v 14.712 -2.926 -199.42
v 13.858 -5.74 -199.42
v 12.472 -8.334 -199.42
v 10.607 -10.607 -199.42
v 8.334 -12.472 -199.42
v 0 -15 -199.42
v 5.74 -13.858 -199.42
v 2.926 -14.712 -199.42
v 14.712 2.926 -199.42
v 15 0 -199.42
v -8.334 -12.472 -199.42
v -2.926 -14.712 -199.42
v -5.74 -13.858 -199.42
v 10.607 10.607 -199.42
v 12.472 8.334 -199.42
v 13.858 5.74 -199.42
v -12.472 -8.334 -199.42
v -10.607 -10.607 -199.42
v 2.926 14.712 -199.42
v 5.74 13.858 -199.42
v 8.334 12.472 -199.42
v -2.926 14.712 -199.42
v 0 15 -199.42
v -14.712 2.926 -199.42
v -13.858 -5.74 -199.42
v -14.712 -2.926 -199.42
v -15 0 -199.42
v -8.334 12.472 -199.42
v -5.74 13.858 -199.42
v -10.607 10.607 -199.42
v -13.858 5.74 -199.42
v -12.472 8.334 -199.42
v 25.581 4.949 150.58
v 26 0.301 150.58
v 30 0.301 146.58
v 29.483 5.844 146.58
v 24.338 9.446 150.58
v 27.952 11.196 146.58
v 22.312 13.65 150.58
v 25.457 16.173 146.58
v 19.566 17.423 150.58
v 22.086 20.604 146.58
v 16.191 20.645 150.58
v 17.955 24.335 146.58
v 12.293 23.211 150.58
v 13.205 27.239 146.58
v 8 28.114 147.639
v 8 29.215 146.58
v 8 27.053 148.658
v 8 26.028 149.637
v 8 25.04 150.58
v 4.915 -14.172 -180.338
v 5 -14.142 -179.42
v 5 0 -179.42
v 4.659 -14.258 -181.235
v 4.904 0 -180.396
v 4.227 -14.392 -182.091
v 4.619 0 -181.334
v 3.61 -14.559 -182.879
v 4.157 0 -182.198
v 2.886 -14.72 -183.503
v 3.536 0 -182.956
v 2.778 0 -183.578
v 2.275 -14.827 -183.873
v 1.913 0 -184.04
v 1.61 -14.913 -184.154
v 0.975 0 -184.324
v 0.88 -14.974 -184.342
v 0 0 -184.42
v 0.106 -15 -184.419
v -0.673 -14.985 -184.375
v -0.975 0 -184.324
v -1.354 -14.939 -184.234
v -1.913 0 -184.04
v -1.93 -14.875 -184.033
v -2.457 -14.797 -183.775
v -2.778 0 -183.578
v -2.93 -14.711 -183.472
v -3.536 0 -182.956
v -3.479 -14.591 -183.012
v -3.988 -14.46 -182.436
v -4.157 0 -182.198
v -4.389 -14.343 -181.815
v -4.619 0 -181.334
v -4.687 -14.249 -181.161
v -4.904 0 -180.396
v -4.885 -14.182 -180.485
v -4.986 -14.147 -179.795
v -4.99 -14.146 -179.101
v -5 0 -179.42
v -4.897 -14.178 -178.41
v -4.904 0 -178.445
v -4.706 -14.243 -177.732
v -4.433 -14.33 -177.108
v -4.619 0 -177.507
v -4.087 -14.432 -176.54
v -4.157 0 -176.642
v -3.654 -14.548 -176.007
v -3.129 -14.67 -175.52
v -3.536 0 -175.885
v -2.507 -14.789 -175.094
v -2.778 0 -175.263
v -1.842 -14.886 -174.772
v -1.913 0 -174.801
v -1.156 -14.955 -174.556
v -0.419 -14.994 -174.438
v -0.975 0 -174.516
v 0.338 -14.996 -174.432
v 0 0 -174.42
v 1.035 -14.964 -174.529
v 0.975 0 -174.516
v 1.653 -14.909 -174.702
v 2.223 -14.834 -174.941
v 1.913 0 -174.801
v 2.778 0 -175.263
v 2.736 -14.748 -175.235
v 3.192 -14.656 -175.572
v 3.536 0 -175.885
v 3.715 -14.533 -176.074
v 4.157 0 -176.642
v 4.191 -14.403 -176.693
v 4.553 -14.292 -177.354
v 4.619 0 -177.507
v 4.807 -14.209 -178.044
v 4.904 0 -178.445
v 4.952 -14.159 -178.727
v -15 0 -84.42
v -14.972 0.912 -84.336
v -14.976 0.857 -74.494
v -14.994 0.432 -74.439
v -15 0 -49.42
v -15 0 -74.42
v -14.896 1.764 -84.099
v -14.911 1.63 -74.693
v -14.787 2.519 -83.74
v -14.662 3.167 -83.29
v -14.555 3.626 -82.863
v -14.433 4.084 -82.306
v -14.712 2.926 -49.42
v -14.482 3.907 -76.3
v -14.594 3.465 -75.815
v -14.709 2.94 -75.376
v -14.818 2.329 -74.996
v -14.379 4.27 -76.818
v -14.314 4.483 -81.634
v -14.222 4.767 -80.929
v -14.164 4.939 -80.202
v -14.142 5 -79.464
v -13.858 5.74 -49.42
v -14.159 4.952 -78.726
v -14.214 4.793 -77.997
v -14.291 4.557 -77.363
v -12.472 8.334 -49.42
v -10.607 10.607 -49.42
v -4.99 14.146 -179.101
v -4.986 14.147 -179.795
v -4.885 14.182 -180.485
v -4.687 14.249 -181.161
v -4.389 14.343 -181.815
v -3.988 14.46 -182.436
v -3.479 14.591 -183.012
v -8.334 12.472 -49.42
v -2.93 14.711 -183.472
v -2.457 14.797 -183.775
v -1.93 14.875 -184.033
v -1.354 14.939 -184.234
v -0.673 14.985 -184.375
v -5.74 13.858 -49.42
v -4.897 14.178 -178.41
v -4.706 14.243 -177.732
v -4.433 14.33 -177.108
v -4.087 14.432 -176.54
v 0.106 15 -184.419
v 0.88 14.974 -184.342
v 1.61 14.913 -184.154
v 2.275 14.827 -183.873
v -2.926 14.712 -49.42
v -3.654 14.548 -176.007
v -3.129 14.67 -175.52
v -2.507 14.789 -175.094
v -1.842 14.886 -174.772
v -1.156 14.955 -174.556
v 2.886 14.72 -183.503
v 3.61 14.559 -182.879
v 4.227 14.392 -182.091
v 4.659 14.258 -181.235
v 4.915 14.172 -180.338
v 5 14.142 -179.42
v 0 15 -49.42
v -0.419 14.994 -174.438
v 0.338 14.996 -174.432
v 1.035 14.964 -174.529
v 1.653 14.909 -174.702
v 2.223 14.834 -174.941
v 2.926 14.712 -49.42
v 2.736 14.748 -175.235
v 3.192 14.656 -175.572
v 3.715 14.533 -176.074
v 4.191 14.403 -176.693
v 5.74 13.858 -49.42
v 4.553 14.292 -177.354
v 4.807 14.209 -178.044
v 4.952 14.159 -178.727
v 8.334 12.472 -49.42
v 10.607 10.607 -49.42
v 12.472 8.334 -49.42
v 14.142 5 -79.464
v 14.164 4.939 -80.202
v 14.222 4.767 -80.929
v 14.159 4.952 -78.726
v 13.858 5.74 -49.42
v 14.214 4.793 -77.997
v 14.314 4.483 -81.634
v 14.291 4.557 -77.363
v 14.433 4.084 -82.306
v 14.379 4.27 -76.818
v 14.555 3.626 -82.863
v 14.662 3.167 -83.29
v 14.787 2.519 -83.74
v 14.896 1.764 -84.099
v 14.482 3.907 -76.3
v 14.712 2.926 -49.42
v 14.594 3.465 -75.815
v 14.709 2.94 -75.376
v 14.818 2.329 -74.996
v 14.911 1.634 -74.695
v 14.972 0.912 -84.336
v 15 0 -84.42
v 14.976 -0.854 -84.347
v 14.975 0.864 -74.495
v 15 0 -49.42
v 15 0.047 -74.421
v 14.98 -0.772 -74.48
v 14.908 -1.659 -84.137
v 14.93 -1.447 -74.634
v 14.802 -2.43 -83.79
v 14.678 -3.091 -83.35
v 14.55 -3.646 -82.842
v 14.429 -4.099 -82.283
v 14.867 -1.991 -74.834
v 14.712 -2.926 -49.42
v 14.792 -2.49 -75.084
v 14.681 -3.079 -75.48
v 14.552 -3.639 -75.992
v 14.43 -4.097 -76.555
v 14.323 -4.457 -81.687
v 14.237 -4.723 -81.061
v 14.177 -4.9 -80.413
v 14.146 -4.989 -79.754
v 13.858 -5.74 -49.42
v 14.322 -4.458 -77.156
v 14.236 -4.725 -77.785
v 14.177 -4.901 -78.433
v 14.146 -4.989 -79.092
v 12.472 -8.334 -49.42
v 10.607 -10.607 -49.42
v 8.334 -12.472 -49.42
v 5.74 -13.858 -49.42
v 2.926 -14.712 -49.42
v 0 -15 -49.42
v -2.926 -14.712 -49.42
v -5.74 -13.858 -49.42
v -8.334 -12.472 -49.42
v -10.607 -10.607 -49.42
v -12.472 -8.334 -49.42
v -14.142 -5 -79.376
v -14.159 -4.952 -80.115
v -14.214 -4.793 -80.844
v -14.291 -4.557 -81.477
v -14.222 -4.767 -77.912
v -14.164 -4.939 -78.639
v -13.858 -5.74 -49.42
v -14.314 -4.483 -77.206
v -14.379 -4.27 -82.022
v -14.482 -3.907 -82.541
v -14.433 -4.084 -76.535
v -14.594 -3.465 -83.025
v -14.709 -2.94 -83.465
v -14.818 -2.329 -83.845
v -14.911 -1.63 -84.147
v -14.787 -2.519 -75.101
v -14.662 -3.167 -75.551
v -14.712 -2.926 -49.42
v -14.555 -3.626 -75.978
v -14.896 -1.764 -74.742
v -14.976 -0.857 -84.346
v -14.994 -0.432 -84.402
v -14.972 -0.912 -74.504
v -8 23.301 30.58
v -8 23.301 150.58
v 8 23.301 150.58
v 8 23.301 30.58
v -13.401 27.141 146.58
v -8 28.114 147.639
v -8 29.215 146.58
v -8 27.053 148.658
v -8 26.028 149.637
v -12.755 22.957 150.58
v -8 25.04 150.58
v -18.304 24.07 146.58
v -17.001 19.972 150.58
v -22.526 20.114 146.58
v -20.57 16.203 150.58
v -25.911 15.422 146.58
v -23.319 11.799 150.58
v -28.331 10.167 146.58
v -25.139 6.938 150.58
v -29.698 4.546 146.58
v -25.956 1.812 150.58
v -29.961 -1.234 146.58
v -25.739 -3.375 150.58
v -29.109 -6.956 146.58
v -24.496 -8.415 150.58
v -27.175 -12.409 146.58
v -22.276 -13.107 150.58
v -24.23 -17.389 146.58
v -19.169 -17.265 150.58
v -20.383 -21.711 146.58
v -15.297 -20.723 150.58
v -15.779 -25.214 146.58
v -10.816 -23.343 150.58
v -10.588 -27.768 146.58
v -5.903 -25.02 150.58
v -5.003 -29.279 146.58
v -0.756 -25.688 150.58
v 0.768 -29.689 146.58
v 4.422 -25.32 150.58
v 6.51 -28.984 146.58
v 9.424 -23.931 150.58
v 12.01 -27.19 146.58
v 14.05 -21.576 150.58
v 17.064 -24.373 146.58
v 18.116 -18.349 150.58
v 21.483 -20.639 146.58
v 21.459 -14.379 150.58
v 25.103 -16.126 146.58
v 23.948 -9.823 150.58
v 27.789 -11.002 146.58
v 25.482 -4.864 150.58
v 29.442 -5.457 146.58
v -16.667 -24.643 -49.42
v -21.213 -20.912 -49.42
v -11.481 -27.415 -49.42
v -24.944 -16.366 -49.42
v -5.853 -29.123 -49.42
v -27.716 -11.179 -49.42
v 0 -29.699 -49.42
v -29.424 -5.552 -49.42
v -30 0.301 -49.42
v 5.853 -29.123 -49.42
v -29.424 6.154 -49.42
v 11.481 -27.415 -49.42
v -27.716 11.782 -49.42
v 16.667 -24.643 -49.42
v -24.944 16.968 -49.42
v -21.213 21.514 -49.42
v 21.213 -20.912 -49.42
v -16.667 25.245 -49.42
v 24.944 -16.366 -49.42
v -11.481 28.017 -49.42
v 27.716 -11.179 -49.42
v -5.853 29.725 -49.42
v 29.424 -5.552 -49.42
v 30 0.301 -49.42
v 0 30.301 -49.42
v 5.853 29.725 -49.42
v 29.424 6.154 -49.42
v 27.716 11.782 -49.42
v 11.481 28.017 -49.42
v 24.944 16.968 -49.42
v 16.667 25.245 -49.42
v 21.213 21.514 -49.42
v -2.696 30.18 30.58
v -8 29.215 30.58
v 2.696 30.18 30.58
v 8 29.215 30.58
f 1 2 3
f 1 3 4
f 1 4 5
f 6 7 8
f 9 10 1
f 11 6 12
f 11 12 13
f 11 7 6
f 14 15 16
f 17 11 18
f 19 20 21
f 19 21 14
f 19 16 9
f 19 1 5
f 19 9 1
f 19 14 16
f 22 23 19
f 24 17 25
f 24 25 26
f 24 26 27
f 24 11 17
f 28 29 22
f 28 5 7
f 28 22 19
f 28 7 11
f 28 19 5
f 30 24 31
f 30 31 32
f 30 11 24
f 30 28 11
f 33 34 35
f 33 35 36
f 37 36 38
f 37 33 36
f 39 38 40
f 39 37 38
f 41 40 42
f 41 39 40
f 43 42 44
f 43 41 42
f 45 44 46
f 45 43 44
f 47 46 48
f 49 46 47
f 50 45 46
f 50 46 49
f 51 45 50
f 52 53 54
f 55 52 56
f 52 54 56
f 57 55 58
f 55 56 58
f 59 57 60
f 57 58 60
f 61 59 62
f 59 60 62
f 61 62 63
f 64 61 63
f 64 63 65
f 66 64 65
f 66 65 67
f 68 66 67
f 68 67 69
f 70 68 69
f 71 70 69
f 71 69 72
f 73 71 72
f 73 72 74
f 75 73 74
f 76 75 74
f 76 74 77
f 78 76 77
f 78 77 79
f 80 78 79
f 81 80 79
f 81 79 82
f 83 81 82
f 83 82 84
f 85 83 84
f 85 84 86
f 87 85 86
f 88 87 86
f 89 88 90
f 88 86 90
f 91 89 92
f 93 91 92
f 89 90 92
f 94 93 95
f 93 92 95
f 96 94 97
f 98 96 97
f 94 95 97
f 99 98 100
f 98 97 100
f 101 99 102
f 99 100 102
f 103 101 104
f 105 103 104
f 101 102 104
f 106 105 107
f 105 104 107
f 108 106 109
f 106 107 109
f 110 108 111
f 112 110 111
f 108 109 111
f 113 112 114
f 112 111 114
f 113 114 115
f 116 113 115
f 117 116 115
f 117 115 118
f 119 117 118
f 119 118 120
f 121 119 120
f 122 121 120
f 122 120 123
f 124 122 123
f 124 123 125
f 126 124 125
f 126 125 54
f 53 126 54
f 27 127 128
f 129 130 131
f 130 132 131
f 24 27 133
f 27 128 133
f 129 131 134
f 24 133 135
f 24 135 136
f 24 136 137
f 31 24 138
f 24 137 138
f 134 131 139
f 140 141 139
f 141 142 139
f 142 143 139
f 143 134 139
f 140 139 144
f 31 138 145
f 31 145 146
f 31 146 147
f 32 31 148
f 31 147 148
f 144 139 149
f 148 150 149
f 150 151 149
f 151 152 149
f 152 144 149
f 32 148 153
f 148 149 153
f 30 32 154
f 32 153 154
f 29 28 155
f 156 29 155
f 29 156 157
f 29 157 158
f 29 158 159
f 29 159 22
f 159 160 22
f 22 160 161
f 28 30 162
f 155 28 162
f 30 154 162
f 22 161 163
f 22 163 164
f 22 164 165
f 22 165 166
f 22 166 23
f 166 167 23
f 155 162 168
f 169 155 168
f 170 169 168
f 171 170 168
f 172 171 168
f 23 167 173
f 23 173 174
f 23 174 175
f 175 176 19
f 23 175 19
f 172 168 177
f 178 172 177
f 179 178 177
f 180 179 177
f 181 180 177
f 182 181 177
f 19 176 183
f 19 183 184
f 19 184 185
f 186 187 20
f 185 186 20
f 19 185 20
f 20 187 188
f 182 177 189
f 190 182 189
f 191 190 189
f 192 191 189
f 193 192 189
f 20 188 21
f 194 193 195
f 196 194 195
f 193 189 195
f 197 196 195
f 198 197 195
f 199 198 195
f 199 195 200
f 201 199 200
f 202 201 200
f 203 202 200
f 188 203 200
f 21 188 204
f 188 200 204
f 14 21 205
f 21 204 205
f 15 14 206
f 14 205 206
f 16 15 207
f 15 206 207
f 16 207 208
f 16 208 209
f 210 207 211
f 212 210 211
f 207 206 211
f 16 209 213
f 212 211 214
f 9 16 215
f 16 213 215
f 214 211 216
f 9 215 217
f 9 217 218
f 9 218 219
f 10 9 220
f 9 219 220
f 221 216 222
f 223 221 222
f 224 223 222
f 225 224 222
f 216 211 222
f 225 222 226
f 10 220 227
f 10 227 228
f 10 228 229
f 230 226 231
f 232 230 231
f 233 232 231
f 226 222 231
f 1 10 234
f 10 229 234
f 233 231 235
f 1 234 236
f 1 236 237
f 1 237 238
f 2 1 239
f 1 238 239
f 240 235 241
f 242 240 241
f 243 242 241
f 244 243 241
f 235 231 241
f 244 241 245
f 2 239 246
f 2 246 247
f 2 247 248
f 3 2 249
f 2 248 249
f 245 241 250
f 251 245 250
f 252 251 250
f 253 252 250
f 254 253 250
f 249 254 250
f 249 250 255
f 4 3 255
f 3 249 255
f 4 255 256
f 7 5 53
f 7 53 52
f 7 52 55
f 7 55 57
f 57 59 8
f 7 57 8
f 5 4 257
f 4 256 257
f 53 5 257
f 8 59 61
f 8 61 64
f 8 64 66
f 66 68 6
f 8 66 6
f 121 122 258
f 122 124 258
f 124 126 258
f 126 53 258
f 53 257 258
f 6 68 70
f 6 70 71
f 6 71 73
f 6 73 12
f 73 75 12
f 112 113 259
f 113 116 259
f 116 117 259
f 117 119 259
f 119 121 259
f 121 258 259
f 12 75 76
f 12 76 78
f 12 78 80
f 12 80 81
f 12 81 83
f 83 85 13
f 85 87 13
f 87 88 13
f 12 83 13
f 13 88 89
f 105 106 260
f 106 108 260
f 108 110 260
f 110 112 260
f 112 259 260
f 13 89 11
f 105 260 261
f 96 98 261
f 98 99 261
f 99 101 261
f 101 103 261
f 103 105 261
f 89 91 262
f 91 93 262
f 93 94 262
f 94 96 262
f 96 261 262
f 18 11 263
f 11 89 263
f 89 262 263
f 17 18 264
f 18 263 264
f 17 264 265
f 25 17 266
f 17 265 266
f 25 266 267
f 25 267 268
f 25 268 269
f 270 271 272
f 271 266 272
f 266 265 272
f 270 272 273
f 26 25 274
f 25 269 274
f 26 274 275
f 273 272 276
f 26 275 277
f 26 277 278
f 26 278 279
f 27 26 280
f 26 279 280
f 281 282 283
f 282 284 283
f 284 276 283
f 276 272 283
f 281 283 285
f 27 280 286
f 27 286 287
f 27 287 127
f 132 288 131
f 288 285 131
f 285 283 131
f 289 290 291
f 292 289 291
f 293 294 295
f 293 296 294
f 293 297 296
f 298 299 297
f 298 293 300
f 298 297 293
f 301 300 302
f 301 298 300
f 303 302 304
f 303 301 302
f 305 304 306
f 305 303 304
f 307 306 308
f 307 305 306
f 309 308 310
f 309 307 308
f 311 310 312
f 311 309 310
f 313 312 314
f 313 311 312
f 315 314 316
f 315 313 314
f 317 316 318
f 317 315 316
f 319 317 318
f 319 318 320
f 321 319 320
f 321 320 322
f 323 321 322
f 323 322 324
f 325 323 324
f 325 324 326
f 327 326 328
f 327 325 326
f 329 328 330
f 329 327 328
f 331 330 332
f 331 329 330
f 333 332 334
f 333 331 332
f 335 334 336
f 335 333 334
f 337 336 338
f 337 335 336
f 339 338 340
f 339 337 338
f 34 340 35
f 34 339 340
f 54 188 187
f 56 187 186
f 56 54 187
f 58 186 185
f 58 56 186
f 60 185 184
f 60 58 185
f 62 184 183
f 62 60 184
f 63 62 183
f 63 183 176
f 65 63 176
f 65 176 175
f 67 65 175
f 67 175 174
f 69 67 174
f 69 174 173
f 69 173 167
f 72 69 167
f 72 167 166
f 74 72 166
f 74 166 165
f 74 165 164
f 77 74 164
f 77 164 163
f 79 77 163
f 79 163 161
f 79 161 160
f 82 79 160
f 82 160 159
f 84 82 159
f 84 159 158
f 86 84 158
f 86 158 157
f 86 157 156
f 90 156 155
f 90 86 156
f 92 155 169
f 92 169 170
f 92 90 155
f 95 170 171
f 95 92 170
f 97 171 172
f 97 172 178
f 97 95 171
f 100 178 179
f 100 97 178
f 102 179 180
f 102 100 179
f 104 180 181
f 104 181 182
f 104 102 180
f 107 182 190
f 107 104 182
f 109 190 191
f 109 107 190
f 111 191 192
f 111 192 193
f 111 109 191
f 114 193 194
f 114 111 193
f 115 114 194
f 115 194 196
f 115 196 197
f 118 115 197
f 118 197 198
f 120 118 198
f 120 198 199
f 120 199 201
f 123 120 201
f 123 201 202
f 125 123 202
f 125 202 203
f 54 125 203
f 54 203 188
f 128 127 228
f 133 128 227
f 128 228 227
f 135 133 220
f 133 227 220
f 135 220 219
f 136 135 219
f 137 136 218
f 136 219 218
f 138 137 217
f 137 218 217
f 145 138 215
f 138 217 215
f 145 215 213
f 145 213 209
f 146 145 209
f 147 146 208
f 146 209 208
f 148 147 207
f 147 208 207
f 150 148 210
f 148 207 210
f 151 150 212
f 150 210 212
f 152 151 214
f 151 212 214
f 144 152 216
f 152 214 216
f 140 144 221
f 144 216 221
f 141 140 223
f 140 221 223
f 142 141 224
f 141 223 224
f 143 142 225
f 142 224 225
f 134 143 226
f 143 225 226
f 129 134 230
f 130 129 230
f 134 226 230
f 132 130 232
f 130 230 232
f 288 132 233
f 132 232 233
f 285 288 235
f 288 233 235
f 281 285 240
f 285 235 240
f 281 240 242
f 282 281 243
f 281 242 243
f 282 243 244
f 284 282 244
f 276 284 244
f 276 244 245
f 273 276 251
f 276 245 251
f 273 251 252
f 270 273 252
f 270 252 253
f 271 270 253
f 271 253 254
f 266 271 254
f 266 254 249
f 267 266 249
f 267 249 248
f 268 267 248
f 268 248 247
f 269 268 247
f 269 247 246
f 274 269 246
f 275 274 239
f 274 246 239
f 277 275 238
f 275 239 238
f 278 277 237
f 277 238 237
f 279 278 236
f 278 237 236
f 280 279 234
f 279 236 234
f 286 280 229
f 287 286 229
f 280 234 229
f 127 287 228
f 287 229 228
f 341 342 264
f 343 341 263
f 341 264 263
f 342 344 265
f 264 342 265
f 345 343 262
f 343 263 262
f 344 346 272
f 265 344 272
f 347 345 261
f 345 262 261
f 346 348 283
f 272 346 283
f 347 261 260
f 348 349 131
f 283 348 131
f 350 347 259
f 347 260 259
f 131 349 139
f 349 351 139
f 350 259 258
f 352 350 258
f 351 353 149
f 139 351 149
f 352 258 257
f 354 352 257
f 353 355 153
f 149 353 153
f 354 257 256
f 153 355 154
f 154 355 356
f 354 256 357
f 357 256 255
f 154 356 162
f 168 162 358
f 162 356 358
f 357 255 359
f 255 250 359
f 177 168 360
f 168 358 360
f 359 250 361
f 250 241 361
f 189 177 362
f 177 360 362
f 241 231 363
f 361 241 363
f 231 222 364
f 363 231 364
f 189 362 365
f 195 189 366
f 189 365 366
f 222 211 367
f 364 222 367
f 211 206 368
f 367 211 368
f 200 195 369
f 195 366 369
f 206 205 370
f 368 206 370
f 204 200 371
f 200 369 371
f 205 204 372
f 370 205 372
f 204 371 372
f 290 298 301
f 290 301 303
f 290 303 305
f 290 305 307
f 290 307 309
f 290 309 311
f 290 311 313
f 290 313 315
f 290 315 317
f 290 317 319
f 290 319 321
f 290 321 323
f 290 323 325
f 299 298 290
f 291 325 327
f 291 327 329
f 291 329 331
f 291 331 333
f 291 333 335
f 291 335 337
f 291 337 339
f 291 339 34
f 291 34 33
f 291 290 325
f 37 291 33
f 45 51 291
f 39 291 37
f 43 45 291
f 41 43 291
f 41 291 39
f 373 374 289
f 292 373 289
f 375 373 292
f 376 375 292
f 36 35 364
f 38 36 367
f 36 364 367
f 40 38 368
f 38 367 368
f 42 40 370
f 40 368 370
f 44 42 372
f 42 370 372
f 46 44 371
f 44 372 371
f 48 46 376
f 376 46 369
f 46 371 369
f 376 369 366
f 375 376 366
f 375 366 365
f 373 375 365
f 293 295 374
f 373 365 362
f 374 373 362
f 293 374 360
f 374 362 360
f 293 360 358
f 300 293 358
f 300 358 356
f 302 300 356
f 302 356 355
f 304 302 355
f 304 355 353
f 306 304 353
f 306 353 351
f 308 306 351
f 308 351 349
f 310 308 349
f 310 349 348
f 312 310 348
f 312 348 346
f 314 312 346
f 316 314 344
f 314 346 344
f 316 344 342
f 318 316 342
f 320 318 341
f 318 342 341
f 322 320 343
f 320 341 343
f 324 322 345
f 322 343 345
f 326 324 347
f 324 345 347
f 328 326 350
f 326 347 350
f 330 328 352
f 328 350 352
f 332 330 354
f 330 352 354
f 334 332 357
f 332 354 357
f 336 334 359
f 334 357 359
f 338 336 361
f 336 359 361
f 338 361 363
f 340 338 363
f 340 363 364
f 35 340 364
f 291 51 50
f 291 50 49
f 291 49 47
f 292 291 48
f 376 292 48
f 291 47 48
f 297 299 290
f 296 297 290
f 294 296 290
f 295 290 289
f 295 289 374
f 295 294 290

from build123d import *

# Parameters (mm, degrees)
SKETCH1_R               = 15
BOSS_EXTRUDE1_DEPTH     = 100
SKETCH2_W               = 8
SKETCH2_H               = 7
CUT_EXTRUDE1_DEPTH      = 60
CHAMFER1_SIZE           = 2
SCALE1_SCALE            = 2
SKETCH3_R               = 15
BOSS_EXTRUDE2_DEPTH     = 150
SKETCH4_R               = 5
CUT_EXTRUDE2_DEPTH      = 31.301047562
CUT_EXTRUDE2_DEPTH_BACK = 30.698952438
SKETCH5_R               = 5
CUT_EXTRUDE3_DEPTH      = 31
CUT_EXTRUDE3_DEPTH_BACK = 31


with BuildPart() as part:
    # Sketch1 → Boss-Extrude1 (new body)
    with BuildSketch(Plane.XY):
        Circle(SKETCH1_R)
    extrude(amount=BOSS_EXTRUDE1_DEPTH)

    # Sketch2 → Cut-Extrude1 (cut)
    with BuildSketch(Plane.XY.offset(100)):
        with Locations((0, 15)):
            Rectangle(SKETCH2_W, SKETCH2_H)
    extrude(amount=-CUT_EXTRUDE1_DEPTH, mode=Mode.SUBTRACT)

    # Chamfer1
    chamfer1_edges = [part.edges().sort_by_distance(p)[0] for p in [
        (-9.082951062, -11.937336386, 100),
    ]]
    chamfer(chamfer1_edges, length=CHAMFER1_SIZE)


with BuildPart() as part_1:
    # Scale1: scaled about (0, -0.301047562, 49.420279713)
    add(part.part.scale(SCALE1_SCALE).moved(Location((0, 0.301047562, -49.420279713))))

    # Sketch3 → Boss-Extrude2 (add)
    with BuildSketch(Plane(origin=(0, 0, -49.420279708), x_dir=(-1, 0, 0), z_dir=(0, 0, -1))):
        Circle(SKETCH3_R)
    extrude(amount=BOSS_EXTRUDE2_DEPTH)

    # Sketch4 → Cut-Extrude2 (cut, two sides)
    with BuildSketch(Plane(origin=(0, 0, 0), x_dir=(1, 0, 0), z_dir=(0, 1, 0))) as cut_extrude2_sk:
        with Locations((0, 179.420279708)):
            Circle(SKETCH4_R)
    extrude(amount=CUT_EXTRUDE2_DEPTH, mode=Mode.SUBTRACT)
    extrude(cut_extrude2_sk.sketch, amount=-CUT_EXTRUDE2_DEPTH_BACK, mode=Mode.SUBTRACT)

    # Sketch5 → Cut-Extrude3 (cut, two sides)
    with BuildSketch(Plane(origin=(0, 0, 0), x_dir=(0, 0, -1), z_dir=(1, 0, 0))) as cut_extrude3_sk:
        with Locations((79.420279708, 0)):
            Circle(SKETCH5_R)
    extrude(amount=CUT_EXTRUDE3_DEPTH, mode=Mode.SUBTRACT)
    extrude(cut_extrude3_sk.sketch, amount=-CUT_EXTRUDE3_DEPTH_BACK, mode=Mode.SUBTRACT)


solid = part_1.part
